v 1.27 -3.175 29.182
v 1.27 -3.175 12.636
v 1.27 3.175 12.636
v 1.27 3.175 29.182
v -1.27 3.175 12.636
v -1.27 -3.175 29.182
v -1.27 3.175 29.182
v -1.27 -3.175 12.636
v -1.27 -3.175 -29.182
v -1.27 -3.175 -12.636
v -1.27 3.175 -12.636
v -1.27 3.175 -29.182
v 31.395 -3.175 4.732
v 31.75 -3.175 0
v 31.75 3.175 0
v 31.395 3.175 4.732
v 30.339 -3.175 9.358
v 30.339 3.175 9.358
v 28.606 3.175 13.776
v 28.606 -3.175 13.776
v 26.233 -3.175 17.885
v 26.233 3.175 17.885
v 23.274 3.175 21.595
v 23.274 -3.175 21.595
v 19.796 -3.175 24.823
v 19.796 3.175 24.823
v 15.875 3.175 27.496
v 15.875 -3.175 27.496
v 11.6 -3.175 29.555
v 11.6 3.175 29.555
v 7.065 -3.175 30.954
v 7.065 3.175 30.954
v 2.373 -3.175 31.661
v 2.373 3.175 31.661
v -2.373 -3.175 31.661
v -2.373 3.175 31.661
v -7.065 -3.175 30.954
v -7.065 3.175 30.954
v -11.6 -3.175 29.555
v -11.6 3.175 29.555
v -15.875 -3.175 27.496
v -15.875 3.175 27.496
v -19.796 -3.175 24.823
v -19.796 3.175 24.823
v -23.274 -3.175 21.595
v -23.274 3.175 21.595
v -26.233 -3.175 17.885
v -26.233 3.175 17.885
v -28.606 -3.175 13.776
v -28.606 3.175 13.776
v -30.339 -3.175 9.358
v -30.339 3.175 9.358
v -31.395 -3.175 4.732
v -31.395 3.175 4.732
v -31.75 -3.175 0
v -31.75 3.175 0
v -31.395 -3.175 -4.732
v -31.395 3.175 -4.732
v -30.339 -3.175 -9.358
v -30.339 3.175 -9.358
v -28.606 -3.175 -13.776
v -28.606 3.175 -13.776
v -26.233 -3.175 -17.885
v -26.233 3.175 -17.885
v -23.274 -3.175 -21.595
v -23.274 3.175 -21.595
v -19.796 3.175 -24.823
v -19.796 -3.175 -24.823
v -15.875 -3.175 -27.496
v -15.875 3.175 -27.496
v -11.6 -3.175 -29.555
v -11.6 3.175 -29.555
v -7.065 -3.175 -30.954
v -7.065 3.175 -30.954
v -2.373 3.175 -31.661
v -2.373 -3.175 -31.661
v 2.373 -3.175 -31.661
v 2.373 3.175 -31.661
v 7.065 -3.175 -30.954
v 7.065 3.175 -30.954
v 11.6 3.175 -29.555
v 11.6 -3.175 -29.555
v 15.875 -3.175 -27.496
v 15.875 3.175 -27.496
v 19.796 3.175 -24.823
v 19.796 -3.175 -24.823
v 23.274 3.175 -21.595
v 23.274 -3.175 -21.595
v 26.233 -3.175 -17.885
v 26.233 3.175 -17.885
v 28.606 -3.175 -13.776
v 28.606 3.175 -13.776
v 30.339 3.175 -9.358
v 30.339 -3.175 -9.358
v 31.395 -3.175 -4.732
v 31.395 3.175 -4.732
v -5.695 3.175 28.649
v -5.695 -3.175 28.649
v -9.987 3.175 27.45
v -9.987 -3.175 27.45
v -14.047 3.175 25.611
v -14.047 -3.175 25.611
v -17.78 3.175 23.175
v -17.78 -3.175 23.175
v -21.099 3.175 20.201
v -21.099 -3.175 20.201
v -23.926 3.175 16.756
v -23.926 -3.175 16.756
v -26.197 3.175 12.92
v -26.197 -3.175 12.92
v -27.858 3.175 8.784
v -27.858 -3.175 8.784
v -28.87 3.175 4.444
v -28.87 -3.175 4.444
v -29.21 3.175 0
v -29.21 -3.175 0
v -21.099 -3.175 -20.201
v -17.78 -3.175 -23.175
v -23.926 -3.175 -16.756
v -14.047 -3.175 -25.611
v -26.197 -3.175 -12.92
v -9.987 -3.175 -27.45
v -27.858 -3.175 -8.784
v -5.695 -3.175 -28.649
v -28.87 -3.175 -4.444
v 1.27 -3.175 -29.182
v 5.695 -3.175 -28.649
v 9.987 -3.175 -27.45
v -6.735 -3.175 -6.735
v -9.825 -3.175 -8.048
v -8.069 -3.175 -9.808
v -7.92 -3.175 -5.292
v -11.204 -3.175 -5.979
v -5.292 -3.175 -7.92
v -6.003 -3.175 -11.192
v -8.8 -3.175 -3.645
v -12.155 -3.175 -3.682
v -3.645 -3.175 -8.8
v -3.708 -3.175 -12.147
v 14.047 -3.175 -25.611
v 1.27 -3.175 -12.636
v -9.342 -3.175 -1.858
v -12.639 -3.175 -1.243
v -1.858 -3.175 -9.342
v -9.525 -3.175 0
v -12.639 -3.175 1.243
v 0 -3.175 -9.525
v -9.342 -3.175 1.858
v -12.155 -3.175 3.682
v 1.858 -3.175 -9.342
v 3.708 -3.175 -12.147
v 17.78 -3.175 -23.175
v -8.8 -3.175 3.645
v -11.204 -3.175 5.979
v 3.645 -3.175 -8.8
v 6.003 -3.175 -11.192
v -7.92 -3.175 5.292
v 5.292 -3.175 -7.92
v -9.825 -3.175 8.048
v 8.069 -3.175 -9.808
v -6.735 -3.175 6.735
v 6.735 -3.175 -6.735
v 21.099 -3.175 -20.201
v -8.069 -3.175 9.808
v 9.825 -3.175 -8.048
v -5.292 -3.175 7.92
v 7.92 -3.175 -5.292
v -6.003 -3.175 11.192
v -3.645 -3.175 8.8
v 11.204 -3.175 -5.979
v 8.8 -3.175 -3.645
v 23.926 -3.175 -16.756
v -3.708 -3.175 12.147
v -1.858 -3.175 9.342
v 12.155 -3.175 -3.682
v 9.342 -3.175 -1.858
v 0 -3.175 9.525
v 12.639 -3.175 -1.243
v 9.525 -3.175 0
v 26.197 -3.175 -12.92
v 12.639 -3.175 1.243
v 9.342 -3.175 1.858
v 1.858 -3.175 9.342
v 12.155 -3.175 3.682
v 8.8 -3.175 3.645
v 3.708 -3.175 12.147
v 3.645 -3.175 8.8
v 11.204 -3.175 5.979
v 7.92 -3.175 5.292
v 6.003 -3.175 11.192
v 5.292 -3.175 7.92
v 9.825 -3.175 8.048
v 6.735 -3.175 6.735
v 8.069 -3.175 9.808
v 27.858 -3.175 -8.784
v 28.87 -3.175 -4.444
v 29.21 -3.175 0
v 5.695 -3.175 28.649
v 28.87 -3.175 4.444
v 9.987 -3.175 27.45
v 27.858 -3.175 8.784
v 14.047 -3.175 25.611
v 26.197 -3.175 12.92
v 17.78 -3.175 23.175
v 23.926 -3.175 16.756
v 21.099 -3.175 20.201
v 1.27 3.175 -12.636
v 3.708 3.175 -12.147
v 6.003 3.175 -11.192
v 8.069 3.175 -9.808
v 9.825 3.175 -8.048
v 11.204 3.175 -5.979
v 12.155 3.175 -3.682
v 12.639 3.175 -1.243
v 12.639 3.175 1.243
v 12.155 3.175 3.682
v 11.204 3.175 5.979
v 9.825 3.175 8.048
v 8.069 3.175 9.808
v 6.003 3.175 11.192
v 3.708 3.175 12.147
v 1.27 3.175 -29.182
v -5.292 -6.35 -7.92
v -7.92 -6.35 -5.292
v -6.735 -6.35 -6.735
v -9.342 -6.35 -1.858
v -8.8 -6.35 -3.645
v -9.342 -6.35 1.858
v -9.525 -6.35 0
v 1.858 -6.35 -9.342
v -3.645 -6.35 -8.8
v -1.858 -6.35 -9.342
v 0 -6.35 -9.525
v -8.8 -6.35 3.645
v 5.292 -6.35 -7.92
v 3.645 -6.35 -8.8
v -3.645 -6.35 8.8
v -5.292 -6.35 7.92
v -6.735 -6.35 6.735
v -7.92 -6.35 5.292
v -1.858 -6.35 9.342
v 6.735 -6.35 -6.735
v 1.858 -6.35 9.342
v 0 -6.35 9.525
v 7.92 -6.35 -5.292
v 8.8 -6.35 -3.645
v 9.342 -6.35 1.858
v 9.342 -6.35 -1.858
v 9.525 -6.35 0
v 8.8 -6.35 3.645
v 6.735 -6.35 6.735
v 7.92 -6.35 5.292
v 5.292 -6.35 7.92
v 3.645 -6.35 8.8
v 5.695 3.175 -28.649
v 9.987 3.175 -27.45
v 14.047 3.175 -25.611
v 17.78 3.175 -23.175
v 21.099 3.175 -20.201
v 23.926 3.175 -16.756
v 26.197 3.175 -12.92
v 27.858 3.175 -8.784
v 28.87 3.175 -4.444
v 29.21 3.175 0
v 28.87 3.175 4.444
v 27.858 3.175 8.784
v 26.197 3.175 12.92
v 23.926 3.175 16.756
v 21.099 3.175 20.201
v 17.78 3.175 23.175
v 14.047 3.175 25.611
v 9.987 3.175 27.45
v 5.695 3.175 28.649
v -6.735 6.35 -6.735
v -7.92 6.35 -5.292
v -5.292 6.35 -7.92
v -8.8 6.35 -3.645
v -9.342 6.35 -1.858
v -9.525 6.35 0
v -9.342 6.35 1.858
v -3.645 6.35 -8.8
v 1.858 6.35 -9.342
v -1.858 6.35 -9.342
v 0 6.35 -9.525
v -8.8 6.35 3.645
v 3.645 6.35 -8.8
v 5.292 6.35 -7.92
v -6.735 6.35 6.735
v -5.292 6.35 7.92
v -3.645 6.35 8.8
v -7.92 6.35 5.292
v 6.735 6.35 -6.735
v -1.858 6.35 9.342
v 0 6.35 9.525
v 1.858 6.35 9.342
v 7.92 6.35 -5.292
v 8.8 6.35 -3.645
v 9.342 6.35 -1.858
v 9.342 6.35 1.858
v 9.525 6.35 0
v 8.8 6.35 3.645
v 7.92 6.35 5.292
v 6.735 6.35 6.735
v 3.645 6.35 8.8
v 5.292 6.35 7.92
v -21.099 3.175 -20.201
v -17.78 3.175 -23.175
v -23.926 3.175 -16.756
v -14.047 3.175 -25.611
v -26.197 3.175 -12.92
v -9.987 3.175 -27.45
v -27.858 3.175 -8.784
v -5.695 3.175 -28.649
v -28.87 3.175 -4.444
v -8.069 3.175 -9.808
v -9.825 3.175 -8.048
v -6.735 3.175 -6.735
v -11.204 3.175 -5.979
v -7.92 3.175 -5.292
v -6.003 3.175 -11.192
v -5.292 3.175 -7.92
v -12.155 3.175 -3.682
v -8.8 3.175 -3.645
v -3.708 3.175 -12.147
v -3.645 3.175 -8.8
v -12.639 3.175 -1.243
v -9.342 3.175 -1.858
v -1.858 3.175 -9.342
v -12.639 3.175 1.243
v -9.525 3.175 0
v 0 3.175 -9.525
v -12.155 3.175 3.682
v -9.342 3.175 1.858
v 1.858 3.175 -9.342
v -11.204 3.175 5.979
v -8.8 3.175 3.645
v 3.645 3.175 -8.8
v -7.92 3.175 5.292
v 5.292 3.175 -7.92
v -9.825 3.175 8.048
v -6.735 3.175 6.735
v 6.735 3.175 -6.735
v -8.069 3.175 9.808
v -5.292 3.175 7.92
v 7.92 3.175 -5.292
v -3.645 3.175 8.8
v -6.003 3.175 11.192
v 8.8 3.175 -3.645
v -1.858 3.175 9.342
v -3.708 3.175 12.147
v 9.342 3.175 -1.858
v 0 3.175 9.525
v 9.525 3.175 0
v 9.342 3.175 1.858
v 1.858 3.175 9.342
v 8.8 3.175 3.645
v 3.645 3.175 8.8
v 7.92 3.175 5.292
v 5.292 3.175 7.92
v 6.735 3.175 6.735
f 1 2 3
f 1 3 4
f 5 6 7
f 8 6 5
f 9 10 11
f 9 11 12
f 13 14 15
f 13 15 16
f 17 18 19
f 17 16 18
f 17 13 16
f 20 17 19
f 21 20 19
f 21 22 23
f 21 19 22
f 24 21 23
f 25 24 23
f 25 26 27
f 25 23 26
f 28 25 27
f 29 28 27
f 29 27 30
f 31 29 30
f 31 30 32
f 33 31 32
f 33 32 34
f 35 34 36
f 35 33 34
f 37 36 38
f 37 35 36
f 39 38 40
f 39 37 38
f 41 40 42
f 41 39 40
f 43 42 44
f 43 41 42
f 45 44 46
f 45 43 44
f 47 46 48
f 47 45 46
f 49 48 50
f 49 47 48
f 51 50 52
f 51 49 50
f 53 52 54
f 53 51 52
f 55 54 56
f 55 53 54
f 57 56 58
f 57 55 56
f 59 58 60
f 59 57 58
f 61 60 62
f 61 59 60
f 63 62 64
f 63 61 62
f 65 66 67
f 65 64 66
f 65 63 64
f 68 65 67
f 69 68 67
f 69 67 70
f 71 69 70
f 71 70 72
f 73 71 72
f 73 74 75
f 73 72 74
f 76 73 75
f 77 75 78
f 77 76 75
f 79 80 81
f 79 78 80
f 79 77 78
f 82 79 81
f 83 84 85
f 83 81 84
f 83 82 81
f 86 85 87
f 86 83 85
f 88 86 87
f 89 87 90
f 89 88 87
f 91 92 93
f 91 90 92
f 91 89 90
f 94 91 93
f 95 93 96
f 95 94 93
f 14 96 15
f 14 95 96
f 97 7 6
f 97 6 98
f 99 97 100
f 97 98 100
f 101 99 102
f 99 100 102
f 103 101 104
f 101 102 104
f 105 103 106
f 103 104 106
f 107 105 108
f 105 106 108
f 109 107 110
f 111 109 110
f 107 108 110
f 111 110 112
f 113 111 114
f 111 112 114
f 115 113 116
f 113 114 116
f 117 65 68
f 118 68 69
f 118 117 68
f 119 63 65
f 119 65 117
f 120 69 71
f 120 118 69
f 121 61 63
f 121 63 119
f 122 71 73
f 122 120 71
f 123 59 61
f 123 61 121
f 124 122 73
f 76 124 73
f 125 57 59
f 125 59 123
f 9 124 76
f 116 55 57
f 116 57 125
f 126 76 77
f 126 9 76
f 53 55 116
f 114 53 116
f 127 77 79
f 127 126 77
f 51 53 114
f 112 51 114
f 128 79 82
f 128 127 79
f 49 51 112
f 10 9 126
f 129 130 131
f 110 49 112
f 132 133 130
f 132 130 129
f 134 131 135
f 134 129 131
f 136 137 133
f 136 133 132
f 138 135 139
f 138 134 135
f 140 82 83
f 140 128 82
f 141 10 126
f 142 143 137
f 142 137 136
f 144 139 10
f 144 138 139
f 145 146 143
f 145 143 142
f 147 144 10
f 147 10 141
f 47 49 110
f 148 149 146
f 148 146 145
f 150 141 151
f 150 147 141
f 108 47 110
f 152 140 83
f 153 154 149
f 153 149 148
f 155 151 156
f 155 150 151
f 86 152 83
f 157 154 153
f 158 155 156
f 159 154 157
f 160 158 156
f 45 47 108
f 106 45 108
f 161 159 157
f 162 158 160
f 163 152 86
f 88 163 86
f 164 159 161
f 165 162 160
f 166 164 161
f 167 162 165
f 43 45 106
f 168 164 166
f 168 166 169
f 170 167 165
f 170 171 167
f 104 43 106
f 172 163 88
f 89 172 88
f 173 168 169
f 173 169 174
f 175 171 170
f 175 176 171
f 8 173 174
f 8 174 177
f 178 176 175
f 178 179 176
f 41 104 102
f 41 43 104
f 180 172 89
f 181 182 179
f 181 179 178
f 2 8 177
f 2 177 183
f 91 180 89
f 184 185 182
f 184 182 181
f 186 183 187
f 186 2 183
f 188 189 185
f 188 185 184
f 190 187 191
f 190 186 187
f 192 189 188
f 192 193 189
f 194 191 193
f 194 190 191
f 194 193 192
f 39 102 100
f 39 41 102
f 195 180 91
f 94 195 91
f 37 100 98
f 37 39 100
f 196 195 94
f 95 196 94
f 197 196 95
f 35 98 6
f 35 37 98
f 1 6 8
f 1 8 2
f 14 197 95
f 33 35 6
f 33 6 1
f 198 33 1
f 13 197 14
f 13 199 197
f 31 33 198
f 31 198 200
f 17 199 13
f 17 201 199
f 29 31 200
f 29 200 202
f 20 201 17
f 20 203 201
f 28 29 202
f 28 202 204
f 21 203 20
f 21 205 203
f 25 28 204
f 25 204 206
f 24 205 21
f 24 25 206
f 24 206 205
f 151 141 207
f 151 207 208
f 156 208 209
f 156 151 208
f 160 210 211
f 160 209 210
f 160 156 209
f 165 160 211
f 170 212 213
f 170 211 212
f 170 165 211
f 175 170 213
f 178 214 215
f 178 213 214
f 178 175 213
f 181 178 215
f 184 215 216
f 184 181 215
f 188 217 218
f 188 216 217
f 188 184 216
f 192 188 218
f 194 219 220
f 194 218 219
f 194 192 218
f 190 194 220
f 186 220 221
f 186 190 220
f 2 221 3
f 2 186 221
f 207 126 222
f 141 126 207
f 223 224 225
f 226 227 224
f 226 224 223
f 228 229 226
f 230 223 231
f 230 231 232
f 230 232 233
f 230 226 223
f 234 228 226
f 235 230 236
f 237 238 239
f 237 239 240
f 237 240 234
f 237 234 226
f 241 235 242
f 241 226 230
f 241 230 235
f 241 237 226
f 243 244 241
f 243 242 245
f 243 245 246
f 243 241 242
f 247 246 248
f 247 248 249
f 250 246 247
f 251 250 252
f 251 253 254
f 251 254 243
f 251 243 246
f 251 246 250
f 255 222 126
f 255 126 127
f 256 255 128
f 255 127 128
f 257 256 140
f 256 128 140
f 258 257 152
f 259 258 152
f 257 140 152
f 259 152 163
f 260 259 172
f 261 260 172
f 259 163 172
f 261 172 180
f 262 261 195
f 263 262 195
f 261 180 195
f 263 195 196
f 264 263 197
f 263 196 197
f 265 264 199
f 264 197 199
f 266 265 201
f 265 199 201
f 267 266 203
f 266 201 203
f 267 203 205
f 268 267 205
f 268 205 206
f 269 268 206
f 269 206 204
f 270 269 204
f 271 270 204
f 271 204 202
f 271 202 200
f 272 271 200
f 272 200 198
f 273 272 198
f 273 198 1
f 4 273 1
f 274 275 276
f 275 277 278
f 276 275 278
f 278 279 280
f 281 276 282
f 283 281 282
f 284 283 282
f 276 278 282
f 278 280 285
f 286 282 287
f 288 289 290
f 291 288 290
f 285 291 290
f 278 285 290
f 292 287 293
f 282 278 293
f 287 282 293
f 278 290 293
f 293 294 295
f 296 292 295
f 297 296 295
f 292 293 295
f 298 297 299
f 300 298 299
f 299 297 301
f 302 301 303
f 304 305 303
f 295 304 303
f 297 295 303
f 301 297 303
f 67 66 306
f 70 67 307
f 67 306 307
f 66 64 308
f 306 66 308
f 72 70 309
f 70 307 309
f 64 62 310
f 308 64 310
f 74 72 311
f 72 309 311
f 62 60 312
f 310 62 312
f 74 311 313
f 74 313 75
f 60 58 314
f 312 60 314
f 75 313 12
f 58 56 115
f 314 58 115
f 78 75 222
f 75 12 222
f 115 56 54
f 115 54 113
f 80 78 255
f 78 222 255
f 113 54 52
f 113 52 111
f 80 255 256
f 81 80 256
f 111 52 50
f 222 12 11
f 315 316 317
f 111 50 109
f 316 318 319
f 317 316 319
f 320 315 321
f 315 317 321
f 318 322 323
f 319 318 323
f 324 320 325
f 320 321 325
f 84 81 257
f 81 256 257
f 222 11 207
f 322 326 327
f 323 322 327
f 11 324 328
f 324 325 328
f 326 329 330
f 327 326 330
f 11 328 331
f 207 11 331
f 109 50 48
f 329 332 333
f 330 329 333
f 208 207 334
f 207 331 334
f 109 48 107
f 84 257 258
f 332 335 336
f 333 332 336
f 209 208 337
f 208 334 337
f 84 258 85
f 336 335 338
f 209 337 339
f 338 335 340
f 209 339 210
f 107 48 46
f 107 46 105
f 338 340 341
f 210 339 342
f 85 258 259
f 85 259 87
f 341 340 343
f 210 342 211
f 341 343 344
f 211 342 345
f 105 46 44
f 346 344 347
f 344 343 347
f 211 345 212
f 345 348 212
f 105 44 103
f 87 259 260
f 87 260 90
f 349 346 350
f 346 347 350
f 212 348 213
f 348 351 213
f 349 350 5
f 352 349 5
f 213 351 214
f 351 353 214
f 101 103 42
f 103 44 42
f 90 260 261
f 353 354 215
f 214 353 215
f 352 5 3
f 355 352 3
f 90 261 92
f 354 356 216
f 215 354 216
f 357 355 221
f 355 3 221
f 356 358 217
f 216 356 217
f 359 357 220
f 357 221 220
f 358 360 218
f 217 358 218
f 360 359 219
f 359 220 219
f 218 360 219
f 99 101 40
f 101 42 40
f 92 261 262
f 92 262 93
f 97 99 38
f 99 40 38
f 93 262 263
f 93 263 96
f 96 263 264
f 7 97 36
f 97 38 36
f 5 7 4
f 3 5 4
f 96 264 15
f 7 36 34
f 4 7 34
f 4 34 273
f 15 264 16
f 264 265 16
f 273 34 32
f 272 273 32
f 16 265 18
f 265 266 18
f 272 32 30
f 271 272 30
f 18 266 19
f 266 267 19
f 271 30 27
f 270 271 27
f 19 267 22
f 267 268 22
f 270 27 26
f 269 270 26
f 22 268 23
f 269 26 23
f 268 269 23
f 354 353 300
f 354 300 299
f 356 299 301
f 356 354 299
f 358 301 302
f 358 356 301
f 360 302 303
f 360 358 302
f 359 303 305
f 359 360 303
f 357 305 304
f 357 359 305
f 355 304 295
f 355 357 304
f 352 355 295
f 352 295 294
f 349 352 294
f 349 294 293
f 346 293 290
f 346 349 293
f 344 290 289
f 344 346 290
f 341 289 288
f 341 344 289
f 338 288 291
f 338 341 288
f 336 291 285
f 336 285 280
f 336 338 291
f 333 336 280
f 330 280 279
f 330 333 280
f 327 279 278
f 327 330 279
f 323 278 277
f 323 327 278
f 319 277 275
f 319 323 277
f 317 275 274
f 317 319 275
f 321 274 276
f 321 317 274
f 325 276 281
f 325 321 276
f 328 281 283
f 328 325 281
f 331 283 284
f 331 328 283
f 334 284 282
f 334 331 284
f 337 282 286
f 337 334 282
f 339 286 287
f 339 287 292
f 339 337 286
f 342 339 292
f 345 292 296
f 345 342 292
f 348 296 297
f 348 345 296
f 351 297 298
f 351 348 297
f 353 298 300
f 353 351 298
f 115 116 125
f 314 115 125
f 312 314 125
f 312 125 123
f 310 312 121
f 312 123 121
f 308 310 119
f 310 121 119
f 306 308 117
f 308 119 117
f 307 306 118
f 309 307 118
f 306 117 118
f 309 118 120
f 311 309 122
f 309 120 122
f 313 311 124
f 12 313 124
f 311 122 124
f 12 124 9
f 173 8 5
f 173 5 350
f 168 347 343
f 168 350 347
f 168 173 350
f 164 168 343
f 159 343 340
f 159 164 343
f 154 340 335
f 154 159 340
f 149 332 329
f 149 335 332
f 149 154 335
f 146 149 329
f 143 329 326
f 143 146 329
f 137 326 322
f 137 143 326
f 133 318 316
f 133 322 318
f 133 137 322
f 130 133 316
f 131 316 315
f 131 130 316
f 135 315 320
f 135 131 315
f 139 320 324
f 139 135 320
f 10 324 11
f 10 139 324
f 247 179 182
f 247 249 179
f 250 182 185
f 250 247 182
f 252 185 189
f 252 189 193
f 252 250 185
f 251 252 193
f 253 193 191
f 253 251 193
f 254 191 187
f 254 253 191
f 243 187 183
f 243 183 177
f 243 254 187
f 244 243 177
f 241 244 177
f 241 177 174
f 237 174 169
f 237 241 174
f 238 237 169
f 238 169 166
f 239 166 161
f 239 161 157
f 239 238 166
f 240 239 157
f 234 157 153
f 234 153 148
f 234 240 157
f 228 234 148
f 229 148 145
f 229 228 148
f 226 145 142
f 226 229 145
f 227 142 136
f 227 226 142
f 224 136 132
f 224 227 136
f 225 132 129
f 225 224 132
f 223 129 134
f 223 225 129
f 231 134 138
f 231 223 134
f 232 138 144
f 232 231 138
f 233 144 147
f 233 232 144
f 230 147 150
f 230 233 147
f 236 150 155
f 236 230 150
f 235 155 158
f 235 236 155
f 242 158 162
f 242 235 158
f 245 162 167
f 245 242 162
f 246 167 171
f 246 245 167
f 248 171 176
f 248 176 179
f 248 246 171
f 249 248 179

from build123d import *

# Parameters (mm, degrees)
F0_R      = 31.75
F1_DEPTH  = 3.175
F2_R      = 29.21
F3_DEPTH  = 6.351
F4_R      = 12.7
F5_DEPTH  = 3.175
F7_DEPTH  = 3.175
F8_COUNT  = 2
F9_R      = 9.525
F10_DEPTH = 6.35


with BuildPart() as f1:
    # F0 (on Front) → F1 (new body, symmetric)
    with BuildSketch(Plane.XZ):
        Circle(F0_R)
    extrude(amount=F1_DEPTH, both=True)

    # F2 (on face) → F3 (cut, through all)
    with BuildSketch(Plane.XZ.offset(3.175)):
        Circle(F2_R)
    extrude(amount=-F3_DEPTH, mode=Mode.SUBTRACT)



with BuildPart() as f5:
    # F4 (on Front) → F5 (new body, symmetric)
    with BuildSketch(Plane.XZ):
        Circle(F4_R)
    extrude(amount=F5_DEPTH, both=True)


with BuildPart() as f1_1:
    add(f1.part)

    add(f5.part)  # F7 merges F5
    # F6 (on Front) → F7 (join, symmetric)
    with BuildSketch(Plane.XZ):
        Polygon((1.27, 30.9208352119), (0, 30.9208352119), (-1.27, 30.9208352119), (-1.27, 0), (0, 0), (1.27, 0), align=None)
    extrude(amount=F7_DEPTH, both=True)

    # F8: F1 ×2 about axis
    f8_axis = Axis((0, -3.175, 0), (0, 1, 0))


with BuildPart() as f1_2:
    add(f1_1.part)
    for i in range(1, F8_COUNT):
        add(f1_1.part.rotate(f8_axis, i * 360 / F8_COUNT))

    # F9 (on Front) → F10 (join, symmetric)
    with BuildSketch(Plane.XZ):
        Circle(F9_R)
    extrude(amount=F10_DEPTH, both=True)


solid = f1_2.part
